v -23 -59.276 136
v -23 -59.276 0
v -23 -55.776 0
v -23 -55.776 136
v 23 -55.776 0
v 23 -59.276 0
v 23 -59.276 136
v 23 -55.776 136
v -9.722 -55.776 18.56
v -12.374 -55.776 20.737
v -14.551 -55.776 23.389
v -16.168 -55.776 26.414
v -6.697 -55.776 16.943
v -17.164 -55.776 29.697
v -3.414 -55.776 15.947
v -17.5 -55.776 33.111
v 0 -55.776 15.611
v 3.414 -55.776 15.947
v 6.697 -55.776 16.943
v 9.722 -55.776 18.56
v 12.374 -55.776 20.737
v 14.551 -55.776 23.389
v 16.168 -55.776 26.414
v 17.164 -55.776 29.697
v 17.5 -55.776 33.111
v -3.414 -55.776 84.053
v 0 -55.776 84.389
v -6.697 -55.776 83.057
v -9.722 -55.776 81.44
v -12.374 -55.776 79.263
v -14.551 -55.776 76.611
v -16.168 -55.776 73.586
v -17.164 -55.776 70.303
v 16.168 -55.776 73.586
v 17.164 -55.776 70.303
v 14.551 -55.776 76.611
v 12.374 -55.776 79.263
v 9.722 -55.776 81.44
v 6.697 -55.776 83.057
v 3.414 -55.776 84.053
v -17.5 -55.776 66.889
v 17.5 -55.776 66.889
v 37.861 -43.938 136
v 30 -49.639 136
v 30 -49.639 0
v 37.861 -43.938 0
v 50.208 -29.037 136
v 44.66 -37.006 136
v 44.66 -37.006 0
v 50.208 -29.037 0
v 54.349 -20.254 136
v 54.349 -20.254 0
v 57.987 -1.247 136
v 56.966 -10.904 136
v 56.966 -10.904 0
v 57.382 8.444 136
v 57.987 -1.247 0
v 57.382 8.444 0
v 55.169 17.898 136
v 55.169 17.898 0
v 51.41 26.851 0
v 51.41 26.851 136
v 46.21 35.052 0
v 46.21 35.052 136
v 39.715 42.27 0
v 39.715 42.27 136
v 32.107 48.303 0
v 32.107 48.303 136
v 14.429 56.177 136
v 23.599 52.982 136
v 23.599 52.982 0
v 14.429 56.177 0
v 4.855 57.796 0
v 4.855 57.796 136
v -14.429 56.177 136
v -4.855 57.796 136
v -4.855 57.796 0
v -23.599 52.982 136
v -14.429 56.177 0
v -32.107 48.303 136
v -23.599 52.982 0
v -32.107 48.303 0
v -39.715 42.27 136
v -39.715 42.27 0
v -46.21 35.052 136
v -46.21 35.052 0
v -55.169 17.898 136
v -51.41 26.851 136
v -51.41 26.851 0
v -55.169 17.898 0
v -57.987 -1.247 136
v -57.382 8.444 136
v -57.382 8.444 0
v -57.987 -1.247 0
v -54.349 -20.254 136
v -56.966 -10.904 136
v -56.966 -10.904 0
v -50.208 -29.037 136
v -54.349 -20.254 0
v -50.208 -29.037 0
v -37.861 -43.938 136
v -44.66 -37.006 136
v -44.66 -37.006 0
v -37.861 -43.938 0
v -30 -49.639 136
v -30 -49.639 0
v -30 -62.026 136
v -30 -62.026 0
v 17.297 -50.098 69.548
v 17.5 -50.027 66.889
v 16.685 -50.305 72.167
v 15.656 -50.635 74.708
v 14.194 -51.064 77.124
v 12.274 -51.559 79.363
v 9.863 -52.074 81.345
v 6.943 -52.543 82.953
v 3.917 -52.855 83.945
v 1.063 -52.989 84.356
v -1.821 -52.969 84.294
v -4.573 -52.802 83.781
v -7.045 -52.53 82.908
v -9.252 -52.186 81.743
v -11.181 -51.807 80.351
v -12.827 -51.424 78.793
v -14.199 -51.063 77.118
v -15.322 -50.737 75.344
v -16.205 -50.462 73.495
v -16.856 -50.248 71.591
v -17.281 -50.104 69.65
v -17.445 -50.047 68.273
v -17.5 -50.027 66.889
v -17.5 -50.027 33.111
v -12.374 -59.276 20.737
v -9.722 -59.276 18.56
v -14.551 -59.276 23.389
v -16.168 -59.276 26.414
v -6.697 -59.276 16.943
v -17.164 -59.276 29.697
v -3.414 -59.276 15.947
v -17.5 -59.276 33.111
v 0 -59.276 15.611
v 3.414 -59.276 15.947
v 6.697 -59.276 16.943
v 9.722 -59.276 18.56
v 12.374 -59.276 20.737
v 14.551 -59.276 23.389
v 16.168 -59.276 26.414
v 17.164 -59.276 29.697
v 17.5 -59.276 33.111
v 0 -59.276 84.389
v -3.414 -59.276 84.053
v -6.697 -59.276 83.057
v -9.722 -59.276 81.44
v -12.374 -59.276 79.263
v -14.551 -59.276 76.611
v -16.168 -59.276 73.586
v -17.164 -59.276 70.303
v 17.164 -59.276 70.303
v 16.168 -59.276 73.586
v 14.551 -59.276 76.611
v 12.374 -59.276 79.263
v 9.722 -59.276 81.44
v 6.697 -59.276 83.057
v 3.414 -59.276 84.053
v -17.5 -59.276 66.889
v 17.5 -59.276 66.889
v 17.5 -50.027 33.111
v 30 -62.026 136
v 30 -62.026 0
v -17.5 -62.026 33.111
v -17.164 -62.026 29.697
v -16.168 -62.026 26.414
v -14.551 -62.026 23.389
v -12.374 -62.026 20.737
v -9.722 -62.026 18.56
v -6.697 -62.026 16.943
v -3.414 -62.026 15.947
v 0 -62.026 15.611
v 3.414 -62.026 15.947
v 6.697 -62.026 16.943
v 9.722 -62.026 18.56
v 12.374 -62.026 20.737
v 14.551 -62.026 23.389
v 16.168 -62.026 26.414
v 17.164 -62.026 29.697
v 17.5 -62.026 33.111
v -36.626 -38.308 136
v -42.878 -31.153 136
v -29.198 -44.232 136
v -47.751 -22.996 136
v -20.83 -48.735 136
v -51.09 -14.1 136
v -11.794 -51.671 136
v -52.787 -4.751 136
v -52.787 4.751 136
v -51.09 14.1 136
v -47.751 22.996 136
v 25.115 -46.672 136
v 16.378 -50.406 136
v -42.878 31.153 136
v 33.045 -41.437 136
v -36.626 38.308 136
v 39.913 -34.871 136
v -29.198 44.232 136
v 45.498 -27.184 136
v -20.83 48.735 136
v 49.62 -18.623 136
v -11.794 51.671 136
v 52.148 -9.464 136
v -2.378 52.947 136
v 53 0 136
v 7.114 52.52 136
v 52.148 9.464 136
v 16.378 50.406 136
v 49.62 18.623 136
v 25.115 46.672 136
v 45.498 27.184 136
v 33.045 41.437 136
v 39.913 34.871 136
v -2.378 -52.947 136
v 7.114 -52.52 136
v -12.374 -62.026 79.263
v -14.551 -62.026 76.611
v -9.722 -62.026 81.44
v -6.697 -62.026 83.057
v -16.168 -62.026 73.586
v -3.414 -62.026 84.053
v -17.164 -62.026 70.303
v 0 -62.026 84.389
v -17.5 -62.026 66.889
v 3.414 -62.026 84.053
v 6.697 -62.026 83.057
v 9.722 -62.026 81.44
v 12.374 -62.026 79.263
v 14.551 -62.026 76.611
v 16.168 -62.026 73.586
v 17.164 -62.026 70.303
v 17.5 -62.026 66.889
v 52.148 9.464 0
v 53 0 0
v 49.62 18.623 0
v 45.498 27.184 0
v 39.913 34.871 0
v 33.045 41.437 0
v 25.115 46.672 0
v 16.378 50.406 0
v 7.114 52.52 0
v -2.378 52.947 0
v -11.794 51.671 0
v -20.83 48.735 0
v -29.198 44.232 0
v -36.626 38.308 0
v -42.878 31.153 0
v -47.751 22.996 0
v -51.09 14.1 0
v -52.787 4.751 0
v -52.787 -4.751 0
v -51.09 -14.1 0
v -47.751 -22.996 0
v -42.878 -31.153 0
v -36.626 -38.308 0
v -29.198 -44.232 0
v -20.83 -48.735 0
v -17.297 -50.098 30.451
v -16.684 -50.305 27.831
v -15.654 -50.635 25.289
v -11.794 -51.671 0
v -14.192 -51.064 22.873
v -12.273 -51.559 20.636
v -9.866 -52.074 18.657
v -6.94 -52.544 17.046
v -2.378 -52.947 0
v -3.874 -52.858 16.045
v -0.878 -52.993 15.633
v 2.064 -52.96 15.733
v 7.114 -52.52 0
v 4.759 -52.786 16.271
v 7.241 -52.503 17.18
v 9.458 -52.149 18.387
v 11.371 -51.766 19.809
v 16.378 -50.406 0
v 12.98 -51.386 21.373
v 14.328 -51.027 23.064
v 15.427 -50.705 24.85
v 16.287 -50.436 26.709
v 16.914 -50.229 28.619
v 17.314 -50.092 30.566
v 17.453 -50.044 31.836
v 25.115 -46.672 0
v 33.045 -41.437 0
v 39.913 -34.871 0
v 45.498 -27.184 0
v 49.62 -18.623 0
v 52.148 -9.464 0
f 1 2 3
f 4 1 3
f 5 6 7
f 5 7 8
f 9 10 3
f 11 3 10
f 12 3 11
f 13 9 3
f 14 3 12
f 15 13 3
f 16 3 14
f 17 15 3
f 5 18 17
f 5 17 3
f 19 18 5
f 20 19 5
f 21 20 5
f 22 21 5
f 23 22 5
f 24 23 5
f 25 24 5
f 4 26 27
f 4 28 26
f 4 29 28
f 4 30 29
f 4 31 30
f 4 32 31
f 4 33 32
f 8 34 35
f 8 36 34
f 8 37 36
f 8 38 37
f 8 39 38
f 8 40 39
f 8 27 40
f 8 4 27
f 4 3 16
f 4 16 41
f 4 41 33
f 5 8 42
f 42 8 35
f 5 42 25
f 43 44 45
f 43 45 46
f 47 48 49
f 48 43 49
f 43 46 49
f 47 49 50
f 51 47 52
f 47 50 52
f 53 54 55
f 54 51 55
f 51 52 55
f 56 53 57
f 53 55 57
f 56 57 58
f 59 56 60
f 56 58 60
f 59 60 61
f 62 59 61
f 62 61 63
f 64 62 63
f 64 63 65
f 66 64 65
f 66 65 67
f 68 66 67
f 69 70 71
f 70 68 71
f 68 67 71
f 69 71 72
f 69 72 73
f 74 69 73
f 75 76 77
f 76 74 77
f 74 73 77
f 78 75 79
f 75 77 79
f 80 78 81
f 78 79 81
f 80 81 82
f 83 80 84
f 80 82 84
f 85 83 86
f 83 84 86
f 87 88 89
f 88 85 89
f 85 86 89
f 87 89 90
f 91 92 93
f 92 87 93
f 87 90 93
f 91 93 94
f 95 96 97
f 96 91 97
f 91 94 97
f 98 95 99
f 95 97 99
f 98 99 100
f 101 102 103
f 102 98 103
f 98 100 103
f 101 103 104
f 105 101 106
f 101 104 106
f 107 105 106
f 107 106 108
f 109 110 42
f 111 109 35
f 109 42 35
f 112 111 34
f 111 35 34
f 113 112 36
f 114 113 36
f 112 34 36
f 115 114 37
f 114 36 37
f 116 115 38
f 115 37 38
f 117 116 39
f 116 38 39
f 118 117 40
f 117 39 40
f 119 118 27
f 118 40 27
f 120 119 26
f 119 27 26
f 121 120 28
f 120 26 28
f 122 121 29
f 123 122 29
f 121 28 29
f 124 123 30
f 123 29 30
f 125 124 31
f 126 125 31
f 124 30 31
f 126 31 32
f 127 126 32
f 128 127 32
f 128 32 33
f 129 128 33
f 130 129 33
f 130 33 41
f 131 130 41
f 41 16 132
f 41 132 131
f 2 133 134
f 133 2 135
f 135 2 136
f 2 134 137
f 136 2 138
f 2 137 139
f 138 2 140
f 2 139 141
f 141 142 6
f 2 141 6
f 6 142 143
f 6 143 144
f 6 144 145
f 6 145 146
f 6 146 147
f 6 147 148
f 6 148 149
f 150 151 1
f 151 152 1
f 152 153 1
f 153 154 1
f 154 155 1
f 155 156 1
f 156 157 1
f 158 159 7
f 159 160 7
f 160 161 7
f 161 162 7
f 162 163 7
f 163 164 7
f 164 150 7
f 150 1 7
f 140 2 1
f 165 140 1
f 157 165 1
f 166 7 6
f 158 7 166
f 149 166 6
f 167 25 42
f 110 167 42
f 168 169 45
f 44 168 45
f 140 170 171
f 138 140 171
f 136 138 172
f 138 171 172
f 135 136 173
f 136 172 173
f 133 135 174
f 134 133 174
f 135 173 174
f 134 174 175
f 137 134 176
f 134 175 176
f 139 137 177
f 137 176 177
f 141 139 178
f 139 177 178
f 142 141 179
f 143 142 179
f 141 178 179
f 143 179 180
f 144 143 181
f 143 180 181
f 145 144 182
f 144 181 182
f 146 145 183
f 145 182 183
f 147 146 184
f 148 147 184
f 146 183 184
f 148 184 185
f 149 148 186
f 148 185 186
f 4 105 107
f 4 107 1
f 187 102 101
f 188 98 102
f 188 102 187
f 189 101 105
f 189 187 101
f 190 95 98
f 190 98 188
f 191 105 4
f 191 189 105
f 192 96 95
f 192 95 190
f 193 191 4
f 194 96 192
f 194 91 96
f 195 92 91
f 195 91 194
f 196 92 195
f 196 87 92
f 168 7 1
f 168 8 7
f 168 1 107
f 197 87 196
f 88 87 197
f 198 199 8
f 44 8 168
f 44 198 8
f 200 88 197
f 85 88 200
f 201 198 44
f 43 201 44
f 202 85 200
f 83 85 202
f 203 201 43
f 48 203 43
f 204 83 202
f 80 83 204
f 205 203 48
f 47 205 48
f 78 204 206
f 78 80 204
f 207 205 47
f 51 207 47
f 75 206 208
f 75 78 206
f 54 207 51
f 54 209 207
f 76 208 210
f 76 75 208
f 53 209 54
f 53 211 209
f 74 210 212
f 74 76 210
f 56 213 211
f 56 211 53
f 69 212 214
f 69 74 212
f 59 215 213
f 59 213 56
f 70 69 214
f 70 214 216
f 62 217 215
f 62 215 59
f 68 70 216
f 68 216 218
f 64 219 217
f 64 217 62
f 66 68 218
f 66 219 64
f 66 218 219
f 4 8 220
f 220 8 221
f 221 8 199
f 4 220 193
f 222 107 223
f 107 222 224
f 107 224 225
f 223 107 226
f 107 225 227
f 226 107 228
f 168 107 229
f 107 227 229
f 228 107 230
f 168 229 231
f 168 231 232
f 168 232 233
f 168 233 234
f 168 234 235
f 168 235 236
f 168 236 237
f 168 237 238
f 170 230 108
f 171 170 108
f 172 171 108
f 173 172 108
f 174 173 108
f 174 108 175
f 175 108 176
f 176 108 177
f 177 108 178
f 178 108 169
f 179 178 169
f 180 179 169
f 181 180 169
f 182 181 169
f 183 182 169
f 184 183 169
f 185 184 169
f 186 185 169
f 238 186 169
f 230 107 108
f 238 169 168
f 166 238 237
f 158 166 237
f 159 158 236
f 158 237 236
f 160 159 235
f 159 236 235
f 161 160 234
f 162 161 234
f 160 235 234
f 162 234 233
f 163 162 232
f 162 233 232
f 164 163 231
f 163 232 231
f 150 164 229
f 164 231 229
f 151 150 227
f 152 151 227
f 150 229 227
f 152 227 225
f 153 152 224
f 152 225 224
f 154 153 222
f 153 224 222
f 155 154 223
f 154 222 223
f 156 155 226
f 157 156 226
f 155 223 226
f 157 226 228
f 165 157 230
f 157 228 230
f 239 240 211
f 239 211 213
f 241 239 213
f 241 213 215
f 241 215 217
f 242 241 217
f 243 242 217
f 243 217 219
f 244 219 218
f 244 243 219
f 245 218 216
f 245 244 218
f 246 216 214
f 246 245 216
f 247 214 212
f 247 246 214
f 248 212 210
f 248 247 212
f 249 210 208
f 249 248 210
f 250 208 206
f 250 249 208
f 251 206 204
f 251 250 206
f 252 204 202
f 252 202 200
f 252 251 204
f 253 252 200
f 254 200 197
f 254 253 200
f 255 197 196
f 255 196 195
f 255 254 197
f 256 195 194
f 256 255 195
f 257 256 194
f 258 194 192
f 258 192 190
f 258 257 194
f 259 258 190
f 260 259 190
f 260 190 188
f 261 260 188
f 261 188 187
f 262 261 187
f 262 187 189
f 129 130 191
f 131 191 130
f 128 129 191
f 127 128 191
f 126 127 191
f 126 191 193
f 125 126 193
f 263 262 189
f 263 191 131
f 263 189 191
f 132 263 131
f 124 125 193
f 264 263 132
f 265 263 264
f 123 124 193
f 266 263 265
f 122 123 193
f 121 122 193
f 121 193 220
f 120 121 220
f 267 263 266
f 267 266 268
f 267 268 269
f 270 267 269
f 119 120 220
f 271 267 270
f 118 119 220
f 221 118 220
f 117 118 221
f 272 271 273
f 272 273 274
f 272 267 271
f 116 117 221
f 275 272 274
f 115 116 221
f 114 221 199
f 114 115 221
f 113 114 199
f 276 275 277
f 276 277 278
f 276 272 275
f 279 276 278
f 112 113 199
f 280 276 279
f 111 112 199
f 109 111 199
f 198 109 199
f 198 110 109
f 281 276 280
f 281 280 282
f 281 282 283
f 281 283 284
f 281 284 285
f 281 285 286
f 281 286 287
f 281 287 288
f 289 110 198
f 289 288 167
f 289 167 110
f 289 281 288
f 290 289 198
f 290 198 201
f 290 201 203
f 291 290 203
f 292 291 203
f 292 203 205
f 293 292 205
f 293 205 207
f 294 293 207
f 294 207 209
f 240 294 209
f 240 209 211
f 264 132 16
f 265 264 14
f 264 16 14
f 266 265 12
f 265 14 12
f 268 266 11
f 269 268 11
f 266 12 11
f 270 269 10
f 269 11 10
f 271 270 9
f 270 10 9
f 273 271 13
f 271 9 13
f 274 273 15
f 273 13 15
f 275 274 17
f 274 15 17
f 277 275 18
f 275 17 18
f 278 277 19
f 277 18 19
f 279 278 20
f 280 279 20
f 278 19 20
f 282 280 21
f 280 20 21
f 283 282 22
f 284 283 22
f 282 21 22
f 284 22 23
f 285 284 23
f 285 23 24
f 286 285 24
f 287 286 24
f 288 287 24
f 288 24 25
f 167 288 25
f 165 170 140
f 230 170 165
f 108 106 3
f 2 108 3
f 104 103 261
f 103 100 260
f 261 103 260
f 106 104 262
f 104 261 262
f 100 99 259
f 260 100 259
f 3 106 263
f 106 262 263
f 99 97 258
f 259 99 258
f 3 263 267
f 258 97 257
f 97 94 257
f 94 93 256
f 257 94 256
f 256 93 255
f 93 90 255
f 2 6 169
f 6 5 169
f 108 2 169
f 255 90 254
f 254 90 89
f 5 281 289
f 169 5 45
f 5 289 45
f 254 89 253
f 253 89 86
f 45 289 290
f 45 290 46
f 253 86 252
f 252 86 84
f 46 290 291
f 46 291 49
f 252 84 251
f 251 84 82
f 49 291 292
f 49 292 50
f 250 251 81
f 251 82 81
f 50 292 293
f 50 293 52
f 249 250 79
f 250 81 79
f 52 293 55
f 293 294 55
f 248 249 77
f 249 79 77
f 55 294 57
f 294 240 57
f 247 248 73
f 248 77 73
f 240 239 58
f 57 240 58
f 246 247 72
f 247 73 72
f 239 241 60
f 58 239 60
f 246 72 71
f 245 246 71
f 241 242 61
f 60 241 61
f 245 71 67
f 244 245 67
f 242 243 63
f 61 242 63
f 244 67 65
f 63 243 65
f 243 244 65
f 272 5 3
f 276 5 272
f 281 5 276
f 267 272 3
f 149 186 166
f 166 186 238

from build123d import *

# Parameters (mm, degrees)
F0_R     = 58
F0_R_2   = 53
F1_DEPTH = 136
F3_DEPTH = 136
F4_W     = 35
F4_H     = 33.777588
F5_DEPTH = 25
F6_W     = 46
F6_H     = 3.5
F7_DEPTH = 136


with BuildPart() as f1:
    # F0 (on Top) → F1 (new body)
    with BuildSketch(Plane.XY):
        Circle(F0_R)
        Circle(F0_R_2, mode=Mode.SUBTRACT)
    extrude(amount=F1_DEPTH)

    # F2 (on Top) → F3 (join)
    with BuildSketch(Plane.XY):
        Polygon((-8.05435, -54.732766), (-30, -45.9545), (-30, -62.025927), (30, -62.025927), (30, -47.670264), (6.974748, -54.732766), align=None)
    extrude(amount=F3_DEPTH)

    # F4 (on face) → F5 (cut)
    with BuildSketch(Plane.XZ.offset(62.025927)):
        with Locations((0, 50)):
            Rectangle(F4_W, F4_H)
        with BuildLine():
            Line((-17.5, 66.888794), (17.5, 66.888794))
            ThreePointArc((17.5, 66.888794), (0, 84.388794), (-17.5, 66.888794))
        make_face()
        with BuildLine():
            ThreePointArc((-17.5, 33.111206), (0, 15.611206), (17.5, 33.111206))
            Line((17.5, 33.111206), (-17.5, 33.111206))
        make_face()
    extrude(amount=-F5_DEPTH, mode=Mode.SUBTRACT)

    # F6 (on face) → F7 (cut)
    with BuildSketch(Plane.XY.offset(136)):
        with Locations((0, -57.525927)):
            Rectangle(F6_W, F6_H)
    extrude(amount=-F7_DEPTH, mode=Mode.SUBTRACT)


solid = f1.part
